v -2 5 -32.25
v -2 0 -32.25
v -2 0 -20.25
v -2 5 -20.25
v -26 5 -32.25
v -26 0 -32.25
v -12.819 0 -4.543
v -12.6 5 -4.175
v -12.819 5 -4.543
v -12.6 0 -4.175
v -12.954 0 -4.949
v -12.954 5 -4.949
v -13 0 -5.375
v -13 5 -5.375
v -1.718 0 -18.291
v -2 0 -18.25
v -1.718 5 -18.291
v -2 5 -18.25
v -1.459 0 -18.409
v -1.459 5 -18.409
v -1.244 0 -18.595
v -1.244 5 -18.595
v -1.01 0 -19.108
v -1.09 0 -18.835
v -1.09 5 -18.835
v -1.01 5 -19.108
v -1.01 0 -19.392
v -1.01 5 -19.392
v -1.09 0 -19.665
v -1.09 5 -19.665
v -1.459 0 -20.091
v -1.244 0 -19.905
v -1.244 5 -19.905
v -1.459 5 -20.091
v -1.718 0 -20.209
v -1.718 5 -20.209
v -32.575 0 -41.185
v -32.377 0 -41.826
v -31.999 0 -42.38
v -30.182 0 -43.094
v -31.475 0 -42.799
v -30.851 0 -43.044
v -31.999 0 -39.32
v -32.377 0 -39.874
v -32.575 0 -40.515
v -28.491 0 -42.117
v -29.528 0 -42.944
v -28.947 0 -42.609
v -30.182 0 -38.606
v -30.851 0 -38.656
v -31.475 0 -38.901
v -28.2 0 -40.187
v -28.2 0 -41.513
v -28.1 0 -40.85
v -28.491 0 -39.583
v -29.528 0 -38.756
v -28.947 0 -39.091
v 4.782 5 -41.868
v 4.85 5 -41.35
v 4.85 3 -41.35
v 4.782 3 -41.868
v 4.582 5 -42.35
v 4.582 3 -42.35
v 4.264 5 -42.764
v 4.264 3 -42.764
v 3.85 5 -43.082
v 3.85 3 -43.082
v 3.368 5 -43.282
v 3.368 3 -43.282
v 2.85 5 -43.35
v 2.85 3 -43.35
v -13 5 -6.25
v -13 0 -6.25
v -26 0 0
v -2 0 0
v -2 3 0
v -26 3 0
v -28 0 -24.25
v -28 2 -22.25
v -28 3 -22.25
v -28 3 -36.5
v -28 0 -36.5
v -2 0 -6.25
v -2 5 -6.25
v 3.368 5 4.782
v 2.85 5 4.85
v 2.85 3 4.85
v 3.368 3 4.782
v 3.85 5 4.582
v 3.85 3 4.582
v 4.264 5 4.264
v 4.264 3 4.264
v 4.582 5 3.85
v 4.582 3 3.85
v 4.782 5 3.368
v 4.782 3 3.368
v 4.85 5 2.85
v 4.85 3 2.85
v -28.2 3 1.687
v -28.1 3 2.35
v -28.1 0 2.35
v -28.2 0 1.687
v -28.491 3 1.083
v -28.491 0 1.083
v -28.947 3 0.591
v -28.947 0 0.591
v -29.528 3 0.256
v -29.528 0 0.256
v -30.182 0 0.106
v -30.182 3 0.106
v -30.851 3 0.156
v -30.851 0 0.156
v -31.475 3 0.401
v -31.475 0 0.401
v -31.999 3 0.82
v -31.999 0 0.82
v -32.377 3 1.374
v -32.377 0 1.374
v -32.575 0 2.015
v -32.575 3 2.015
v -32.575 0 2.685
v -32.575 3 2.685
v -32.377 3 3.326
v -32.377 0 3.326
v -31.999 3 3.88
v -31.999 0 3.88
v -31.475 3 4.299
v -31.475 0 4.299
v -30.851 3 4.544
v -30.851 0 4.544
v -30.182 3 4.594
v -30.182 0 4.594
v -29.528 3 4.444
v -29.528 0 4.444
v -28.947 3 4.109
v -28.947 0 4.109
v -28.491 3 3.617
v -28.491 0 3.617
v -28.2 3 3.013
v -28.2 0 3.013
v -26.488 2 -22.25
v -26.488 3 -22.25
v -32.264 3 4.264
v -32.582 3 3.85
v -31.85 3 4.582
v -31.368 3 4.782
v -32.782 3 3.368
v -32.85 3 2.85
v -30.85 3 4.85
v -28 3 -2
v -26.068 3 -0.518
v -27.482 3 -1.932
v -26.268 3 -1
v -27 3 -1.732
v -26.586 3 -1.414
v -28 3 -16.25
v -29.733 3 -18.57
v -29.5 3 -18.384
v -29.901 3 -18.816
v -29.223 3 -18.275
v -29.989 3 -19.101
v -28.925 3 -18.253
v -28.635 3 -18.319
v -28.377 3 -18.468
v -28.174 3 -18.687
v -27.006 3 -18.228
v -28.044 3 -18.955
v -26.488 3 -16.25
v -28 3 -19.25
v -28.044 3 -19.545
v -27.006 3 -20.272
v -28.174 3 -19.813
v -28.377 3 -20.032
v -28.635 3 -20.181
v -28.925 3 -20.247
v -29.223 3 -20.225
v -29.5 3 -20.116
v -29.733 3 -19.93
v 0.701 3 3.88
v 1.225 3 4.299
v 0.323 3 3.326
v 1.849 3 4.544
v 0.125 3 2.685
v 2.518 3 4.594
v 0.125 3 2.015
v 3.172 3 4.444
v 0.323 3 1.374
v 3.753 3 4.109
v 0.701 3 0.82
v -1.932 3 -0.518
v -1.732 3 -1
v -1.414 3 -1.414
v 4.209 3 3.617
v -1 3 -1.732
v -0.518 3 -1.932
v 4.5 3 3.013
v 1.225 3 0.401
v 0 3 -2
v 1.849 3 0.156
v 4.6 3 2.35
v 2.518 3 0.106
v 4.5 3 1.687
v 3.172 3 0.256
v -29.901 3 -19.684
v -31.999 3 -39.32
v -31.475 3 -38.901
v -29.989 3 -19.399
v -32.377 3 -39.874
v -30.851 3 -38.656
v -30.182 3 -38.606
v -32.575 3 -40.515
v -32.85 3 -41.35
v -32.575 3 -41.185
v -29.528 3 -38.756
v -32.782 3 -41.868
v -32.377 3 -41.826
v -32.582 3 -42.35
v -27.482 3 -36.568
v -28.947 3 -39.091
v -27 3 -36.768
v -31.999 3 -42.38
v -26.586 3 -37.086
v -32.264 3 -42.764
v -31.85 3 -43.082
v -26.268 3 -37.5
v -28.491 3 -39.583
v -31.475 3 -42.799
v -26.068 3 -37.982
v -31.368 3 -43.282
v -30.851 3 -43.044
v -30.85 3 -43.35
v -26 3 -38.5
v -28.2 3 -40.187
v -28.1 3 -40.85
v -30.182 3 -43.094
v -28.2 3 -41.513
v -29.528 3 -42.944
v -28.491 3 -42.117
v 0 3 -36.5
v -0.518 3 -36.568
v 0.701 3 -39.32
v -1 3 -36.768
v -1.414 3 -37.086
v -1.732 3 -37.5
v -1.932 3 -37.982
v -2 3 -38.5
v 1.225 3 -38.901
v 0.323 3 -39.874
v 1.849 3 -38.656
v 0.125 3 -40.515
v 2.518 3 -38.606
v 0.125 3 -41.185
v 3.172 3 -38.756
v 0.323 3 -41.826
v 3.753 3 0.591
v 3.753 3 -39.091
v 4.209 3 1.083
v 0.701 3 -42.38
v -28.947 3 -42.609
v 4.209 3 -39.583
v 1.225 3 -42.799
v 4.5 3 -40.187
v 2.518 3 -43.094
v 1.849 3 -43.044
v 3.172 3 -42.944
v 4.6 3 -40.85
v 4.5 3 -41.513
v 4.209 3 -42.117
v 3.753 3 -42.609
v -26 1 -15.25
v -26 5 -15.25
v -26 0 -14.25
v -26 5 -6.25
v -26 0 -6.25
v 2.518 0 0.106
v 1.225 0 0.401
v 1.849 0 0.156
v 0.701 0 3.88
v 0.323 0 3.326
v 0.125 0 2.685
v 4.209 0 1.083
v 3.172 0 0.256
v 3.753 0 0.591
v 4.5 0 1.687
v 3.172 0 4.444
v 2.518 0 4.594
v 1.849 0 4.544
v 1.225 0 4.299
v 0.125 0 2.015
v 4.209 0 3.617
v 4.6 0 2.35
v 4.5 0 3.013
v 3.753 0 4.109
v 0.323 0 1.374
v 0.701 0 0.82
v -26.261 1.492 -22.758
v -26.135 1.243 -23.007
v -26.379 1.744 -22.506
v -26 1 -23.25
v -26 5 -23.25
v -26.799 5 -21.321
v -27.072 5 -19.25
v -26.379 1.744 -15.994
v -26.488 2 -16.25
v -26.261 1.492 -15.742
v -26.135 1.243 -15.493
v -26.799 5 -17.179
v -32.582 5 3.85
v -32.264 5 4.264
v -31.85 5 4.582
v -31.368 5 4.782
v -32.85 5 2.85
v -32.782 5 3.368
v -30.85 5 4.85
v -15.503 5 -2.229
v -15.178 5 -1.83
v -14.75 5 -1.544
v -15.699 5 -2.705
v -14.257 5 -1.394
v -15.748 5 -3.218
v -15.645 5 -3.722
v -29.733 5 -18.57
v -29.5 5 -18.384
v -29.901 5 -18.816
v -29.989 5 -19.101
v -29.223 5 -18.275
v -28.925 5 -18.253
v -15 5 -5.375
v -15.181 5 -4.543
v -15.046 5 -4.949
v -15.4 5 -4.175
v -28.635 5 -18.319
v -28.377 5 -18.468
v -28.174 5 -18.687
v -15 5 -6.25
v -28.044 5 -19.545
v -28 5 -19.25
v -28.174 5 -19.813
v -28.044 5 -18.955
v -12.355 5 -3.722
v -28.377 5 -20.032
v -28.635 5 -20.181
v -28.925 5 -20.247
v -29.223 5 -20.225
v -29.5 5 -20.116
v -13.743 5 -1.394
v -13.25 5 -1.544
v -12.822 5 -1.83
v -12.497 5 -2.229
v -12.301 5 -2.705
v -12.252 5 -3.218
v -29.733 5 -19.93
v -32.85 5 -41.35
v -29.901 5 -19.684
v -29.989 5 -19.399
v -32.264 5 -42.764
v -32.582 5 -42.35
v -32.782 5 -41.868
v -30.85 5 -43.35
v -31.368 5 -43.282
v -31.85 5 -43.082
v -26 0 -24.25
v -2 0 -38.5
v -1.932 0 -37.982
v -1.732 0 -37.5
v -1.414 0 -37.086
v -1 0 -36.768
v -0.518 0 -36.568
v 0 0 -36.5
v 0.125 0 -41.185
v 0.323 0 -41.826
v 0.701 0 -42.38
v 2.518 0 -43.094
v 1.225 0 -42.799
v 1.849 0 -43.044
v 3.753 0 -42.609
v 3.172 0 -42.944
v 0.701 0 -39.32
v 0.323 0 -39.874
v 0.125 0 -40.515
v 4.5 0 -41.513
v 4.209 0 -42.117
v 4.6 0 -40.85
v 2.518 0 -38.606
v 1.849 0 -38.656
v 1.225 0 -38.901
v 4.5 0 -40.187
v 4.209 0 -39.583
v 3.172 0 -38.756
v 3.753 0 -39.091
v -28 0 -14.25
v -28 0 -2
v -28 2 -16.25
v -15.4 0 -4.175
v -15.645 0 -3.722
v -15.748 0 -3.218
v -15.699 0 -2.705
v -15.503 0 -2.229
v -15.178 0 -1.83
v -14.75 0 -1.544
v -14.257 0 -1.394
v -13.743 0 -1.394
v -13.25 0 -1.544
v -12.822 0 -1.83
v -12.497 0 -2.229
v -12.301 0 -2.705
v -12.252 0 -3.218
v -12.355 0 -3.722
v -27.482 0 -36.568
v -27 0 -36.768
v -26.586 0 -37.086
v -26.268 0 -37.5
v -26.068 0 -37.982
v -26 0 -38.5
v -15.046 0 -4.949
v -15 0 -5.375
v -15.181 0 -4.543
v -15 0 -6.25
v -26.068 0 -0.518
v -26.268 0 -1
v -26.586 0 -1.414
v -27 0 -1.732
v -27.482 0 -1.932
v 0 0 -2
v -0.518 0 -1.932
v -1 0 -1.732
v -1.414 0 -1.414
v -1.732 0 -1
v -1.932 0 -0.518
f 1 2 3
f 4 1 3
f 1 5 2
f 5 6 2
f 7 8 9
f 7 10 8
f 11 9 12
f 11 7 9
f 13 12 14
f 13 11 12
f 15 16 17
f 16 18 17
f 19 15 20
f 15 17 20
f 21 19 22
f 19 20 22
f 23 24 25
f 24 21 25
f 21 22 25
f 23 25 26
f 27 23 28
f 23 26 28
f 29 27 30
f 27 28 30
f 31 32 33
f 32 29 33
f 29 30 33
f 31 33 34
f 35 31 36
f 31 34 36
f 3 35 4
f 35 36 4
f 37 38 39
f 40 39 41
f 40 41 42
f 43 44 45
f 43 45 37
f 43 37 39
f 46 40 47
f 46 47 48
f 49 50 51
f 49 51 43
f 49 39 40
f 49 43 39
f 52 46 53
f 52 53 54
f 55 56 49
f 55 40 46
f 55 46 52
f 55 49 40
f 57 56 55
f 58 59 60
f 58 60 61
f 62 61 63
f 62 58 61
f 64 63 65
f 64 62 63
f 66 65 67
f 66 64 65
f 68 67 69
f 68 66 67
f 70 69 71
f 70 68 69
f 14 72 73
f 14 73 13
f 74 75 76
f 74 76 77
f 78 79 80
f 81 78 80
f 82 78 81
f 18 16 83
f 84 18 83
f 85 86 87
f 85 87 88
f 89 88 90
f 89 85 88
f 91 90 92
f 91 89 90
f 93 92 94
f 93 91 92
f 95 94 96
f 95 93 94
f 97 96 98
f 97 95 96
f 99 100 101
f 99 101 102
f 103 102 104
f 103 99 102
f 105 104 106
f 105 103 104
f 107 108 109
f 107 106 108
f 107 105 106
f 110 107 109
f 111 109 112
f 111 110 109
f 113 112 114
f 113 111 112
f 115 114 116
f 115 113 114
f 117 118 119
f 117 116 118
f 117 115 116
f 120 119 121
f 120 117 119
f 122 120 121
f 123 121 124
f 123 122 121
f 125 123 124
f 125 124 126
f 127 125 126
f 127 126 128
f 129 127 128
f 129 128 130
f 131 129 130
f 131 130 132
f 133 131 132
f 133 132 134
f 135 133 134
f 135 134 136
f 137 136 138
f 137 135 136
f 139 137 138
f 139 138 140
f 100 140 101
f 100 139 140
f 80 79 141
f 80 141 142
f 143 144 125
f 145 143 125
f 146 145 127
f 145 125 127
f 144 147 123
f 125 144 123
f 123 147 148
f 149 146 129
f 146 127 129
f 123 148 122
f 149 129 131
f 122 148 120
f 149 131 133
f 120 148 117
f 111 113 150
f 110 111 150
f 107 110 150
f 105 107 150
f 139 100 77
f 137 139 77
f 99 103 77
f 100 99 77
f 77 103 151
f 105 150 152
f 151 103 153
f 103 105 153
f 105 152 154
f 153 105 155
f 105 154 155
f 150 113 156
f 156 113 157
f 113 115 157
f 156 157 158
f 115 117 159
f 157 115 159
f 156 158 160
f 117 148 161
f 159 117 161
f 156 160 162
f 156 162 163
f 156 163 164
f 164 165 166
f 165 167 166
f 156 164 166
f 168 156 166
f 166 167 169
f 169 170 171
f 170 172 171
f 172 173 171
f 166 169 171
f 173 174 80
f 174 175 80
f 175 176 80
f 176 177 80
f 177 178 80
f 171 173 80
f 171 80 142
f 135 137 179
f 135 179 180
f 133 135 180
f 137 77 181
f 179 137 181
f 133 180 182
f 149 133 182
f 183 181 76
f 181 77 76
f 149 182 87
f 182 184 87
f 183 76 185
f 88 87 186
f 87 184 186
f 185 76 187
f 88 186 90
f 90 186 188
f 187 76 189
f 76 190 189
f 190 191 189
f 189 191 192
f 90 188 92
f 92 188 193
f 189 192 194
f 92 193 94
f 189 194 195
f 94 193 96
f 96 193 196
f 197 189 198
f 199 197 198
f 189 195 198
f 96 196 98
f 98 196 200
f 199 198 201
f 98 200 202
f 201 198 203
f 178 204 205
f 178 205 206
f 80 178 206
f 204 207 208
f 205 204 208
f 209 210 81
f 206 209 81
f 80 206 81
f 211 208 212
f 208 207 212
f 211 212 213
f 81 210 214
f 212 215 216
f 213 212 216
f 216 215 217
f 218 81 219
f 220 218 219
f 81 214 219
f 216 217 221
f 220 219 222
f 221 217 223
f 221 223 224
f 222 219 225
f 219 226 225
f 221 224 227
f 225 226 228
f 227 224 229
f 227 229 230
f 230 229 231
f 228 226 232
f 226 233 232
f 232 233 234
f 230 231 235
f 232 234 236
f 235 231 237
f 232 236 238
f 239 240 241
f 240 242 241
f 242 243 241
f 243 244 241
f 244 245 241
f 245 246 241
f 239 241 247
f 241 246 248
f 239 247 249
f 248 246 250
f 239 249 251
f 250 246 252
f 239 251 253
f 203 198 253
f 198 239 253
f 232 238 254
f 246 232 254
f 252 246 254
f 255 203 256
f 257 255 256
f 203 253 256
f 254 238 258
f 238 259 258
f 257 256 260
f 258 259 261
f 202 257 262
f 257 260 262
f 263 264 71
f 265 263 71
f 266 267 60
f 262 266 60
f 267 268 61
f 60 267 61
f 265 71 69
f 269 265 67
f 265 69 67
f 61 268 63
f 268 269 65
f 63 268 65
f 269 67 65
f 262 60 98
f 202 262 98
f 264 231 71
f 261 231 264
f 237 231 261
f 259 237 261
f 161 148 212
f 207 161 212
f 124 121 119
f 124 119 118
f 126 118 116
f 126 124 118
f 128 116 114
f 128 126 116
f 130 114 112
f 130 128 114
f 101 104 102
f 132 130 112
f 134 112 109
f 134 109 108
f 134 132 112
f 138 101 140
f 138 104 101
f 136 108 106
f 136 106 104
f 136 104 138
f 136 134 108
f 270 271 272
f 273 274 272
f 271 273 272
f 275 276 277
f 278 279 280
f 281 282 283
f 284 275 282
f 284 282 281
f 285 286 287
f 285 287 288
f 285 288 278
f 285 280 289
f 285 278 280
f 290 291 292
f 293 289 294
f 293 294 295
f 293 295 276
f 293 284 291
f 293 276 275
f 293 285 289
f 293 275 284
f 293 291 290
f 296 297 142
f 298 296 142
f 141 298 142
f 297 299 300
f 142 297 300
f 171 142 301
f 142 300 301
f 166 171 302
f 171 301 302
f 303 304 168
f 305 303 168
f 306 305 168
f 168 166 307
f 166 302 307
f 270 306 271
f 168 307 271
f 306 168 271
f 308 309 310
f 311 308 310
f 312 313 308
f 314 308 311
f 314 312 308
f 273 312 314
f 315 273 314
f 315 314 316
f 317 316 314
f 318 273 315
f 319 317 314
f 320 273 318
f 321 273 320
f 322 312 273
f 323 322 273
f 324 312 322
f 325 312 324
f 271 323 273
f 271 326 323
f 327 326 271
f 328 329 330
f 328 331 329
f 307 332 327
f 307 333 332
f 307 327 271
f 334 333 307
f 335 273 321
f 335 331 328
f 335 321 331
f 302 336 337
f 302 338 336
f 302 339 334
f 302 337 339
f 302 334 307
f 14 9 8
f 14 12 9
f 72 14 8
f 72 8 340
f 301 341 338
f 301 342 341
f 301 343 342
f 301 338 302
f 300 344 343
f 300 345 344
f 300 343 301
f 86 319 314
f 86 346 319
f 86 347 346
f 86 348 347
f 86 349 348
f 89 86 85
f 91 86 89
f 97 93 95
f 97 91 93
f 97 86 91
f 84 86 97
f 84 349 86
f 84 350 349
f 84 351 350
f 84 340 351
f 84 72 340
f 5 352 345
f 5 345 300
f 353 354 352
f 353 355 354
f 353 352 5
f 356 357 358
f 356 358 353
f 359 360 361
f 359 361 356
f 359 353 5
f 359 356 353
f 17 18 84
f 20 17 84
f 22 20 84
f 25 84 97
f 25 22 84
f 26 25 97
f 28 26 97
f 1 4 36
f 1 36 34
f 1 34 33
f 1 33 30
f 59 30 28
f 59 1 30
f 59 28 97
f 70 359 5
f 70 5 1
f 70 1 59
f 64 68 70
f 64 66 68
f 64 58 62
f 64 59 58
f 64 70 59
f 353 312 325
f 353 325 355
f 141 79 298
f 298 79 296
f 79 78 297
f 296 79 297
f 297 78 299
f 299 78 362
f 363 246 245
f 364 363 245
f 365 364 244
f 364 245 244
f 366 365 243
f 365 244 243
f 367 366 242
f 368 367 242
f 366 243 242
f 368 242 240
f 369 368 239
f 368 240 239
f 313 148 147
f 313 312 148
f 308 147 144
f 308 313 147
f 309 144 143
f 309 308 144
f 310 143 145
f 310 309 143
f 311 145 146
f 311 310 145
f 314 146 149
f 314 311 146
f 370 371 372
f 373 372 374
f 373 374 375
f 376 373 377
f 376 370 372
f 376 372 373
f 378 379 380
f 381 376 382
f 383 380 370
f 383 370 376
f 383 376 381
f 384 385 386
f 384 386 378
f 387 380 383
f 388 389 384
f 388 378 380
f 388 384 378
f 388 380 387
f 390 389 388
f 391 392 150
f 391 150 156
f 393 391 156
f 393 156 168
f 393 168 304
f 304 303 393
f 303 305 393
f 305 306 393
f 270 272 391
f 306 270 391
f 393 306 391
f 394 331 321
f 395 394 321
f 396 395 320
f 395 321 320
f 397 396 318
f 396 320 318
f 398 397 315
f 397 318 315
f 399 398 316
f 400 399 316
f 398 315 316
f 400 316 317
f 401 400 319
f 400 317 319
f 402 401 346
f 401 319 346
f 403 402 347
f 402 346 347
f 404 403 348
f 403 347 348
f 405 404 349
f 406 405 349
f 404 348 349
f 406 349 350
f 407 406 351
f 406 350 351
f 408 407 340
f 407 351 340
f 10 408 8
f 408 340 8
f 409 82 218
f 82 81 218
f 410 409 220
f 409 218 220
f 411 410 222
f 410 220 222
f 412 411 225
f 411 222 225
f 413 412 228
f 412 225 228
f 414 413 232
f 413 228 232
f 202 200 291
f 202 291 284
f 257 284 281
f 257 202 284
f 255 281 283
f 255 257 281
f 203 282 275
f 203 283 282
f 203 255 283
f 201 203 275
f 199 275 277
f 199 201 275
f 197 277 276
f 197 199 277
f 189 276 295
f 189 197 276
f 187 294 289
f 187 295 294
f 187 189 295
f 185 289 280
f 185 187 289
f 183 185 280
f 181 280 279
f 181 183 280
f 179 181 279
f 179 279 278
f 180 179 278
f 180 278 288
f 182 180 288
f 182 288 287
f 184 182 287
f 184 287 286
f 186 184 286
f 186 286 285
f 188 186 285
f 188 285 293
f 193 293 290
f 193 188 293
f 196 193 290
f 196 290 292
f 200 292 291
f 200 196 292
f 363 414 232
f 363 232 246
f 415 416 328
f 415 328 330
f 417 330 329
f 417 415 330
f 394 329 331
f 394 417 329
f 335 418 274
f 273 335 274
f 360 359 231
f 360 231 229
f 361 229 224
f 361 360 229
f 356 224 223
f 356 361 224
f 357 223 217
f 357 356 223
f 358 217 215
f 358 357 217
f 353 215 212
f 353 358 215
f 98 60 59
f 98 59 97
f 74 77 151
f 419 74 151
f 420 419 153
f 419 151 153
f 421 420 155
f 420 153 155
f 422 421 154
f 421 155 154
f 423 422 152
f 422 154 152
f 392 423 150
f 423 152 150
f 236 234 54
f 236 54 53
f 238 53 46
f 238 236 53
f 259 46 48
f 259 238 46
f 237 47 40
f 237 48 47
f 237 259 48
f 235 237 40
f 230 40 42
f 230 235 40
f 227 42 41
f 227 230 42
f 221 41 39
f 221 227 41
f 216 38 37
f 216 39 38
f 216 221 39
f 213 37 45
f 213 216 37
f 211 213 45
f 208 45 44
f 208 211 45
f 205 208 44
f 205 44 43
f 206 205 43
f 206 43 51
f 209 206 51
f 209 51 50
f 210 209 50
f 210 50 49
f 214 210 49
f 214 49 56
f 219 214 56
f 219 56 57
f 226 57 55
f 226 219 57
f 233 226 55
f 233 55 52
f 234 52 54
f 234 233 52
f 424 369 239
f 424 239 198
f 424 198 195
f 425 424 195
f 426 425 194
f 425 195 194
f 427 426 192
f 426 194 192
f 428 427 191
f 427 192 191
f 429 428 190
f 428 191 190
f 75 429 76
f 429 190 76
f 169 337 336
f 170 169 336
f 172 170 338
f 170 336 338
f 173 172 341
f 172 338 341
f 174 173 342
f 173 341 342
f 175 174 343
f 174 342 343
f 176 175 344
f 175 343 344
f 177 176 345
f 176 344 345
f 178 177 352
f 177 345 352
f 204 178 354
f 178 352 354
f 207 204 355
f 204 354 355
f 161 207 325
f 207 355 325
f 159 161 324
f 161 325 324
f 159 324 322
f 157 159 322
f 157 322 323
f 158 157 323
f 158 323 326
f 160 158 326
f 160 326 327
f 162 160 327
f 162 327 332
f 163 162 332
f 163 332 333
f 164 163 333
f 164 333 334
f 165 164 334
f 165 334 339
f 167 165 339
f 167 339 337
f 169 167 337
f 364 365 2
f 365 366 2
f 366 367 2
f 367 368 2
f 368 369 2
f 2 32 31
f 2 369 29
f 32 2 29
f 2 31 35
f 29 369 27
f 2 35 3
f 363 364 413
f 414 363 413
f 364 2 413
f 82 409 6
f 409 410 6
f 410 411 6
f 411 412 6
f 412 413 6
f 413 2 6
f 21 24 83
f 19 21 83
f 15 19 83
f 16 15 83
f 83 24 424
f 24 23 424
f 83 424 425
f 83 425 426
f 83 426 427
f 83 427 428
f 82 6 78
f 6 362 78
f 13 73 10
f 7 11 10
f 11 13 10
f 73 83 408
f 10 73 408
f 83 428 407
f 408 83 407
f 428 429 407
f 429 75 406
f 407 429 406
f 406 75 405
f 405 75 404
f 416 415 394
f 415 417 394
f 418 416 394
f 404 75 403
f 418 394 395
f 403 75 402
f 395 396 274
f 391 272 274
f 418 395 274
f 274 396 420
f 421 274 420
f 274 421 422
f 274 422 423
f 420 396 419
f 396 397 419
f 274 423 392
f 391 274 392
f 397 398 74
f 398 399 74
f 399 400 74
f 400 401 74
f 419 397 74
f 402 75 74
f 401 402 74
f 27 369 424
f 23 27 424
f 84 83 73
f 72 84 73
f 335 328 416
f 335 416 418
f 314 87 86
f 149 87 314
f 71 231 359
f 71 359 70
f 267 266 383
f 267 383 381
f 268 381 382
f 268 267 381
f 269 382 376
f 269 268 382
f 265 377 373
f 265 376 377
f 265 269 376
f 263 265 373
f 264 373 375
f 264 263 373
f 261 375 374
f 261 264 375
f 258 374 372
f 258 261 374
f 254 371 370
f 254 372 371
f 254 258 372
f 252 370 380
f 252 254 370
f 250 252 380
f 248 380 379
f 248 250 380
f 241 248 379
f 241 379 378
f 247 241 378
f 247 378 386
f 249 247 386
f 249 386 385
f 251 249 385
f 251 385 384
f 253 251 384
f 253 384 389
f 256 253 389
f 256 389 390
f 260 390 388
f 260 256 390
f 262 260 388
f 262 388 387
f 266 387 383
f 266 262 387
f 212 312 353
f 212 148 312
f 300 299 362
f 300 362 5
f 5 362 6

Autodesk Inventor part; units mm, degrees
ref_plane "YZ Plane" through (0, 0, 0) normal (1, 0, 0) x (0, 1, 0)
ref_plane "XZ Plane" through (0, 0, 0) normal (0, 1, 0) x (-1, 0, 0)
ref_plane "XY Plane" through (0, 0, 0) normal (0, 0, 1) x (1, 0, 0)
sketch "Sketch1" plane through (0, 0, 0) normal (0, 1, 0) x (-1, 0, 0)
  line L0 (0, 0) -> (28, 0)
  line L1 (28, 0) -> (28, -38.5)
  line L2 (28, -38.5) -> (0, -38.5)
  line L3 (0, -38.5) -> (0, 0)
  line L4 (26, -6.25) -> (2, -6.25)
  line L5 (2, -6.25) -> (2, -32.25)
  line L6 (2, -32.25) -> (26, -32.25)
  line L7 (26, -32.25) -> (26, -6.25)
  dimension "d0" = 28
  dimension "d1" = 38.5
  dimension "d2" = 24
  dimension "d3" = 26
  dimension "d43" = 2
  dimension "d44" = 6.25
extrude "Extrusion1" add sketch "Sketch1" along normal blind 3
sketch "Sketch2" plane through (0, 3, 0) normal (0, 1, 0) x (1, 0, 0)
  line L0 (-28, 0) -> (0, 0) projected
  circle A0 centre (0, 0) radius 2
  circle A1 centre (-28, 0) radius 2
  line L1 (0, 38.5) -> (-28, 38.5) projected
  circle A2 centre (-28, 38.5) radius 2
  circle A3 centre (0, 38.5) radius 2
  dimension "d8" = 4
  dimension "d9" = 4
  dimension "d10" = 4
  dimension "d11" = 4
extrude "Extrusion2" cut sketch "Sketch2" against normal blind 3
sketch "Sketch3" plane through (0, 3, 0) normal (0, 1, 0) x (1, 0, 0)
  line L0 (-32.85, 43.35) -> (4.85, 43.35)
  line L1 (4.85, 43.35) -> (4.85, -4.85)
  line L2 (4.85, -4.85) -> (-32.85, -4.85)
  line L3 (-32.85, -4.85) -> (-32.85, 43.35)
  line L4 (-2, 38.5) -> (-26, 38.5) projected
  line L5 (0, 2) -> (0, 36.5) projected
  line L6 (-2, 32.25) -> (-2, 6.25) projected
  line L7 (-26, 6.25) -> (-26, 32.25) projected
  line L8 (-2, 6.25) -> (-26, 6.25)
  line L9 (-26, 6.25) -> (-26, 32.25)
  line L10 (-26, 32.25) -> (-2, 32.25)
  line L11 (-2, 32.25) -> (-2, 6.25)
  point P0 (0, 0)
  point P1 (-26, 6.25)
  dimension "d14" = 48.2
  dimension "d15" = 37.7
  dimension "d16" = 4.85
  dimension "d17" = 4.85
extrude "Extrusion3" add sketch "Sketch3" along normal blind 2
sketch "Sketch4" plane through (0, 3, 0) normal (0, -1, 0) x (1, 0, 0)
  circle A0 centre (2.35, -40.85) radius 2.25
  line L0 (-2, -38.5) -> (-26, -38.5) projected
  line L1 (0, -2) -> (0, -36.5) projected
  circle A1 centre (-30.35, -40.85) radius 2.25
  line L2 (-28, -36.5) -> (-28, -2) projected
  circle A2 centre (-30.35, 2.35) radius 2.25
  line L3 (-26, 0) -> (-2, 0) projected
  circle A3 centre (2.35, 2.35) radius 2.25
  point P0 (0, 0)
  dimension "d20" = 4.5
  dimension "d21" = 2.35
  dimension "d22" = 2.35
  dimension "d23" = 4.5
  dimension "d24" = 2.35
  dimension "d25" = 2.35
  dimension "d26" = 4.5
  dimension "d27" = 2.35
  dimension "d28" = 4.5
  dimension "d29" = 2.35
  dimension "d30" = 2.35
  dimension "d31" = 2.35
extrude "Extrusion4" add sketch "Sketch4" along normal blind 3
fillet "Fillet1" radius 2 4 edges at (4.85, 4, -43.35) (4.85, 4, 4.85) (-32.85, 4, 4.85) (-32.85, 4, -43.35)
sketch "Sketch5" plane through (0, 5, 0) normal (0, 1, 0) x (1, 0, 0)
  line L0 (-26, 32.25) -> (-2, 32.25) projected
  line L1 (-2, 6.25) -> (-26, 6.25) projected
  line L2 (-2, 32.25) -> (-2, 6.25) projected
  line L3 (-26, 6.25) -> (-26, 32.25) projected
  circle A0 centre (-2, 19.25) radius 1
  circle A1 centre (-29, 19.25) radius 1
  line L4 (4.85, -2.85) -> (4.85, 41.35) projected
  point P0 (0, 0)
  dimension "d45" = 2
  dimension "d46" = 2
  dimension "d47" = 13
  dimension "d50" = 13
  dimension "d73" = 27
  dimension "d75" = 3
extrude "Extrusion6" cut sketch "Sketch5" against normal through all contours A0 L2 | L2 A0 | A1
sketch "Sketch6" plane through (-28, 0, -36.5) normal (-1, 0, 0) x (0, 0, 1)
  line L0 (0, 0) -> (34.5, 0) projected
  line L1 (-4.85, 3) -> (39.35, 3) projected
  line L2 (20.25, 0) -> (14.25, 0)
  line L3 (14.25, 0) -> (14.25, 3)
  line L4 (14.25, 3) -> (20.25, 3)
  line L5 (20.25, 3) -> (20.25, 0)
  line L6 (41.35, 3) -> (41.35, 5) projected
  point P0 (36.5, 0)
  point P1 (41.35, 4)
  dimension "d53" = 6
  dimension "d54" = 21.1
extrude "Extrusion7" cut sketch "Sketch6" against normal blind 10
chamfer "Chamfer1" distance 2 angle 45 2 edges at (-27, 0, -22.25) (-27, 0, -16.25)
sketch "Sketch7" plane through (0, 5, 0) normal (0, 1, 0) x (1, 0, 0)
  line L0 (-30.85, -4.85) -> (2.85, -4.85) projected
  line L1 (-26, 6.25) -> (-26, 32.25) projected
  arc A0 (-26, 23.25) -> (-26, 15.25) centre (-19.0718, 19.25) ccw
  line L2 (-26, 23.25) -> (-26, 15.25)
  point P0 (0, 0)
  dimension "d63" = 8
  dimension "d64" = 20.1
  dimension "d65" = 8
extrude "Extrusion8" cut sketch "Sketch7" against normal blind 10
sketch "Sketch8" plane through (0, 5, 0) normal (0, 1, 0) x (1, 0, 0)
  circle A0 centre (-14, 3.125) radius 1.75
  line L0 (-2, 6.25) -> (-26, 6.25) projected
  line L1 (-26, 0) -> (-2, 0) projected
  line L2 (-32.85, 41.35) -> (-32.85, -2.85) projected
  point P0 (0, 0)
  dimension "d68" = 3.5
  dimension "d69" = 3.125
  dimension "d70" = 18.85
extrude "Extrusion9" cut sketch "Sketch8" against normal through all
sketch "Sketch9" plane through (0, 5, 0) normal (0, 1, 0) x (1, 0, 0)
  circle A0 centre (-14, 3.125) radius 1.75 projected
  line L0 (-15, 4.5611) -> (-15, 6.25)
  line L1 (-15, 6.25) -> (-13, 6.25)
  line L2 (-13, 6.25) -> (-13, 4.5611)
  arc A1 (-13, 4.5611) -> (-15, 4.5611) centre (-14, 3.125) ccw
  line L3 (-2, 6.25) -> (-26, 6.25) projected
  point P0 (0, 0)
  point P1 (-14, 6.25)
  dimension "d76" = 2
  dimension "d77" = 1
extrude "Extrusion10" cut sketch "Sketch9" against normal through all contours A0 L0 L1 L2
fillet "Fillet2" radius 2 2 edges at (-15, 2.5, -4.5611) (-13, 2.5, -4.5611)
properties part number "ServoFullMountInsert"
